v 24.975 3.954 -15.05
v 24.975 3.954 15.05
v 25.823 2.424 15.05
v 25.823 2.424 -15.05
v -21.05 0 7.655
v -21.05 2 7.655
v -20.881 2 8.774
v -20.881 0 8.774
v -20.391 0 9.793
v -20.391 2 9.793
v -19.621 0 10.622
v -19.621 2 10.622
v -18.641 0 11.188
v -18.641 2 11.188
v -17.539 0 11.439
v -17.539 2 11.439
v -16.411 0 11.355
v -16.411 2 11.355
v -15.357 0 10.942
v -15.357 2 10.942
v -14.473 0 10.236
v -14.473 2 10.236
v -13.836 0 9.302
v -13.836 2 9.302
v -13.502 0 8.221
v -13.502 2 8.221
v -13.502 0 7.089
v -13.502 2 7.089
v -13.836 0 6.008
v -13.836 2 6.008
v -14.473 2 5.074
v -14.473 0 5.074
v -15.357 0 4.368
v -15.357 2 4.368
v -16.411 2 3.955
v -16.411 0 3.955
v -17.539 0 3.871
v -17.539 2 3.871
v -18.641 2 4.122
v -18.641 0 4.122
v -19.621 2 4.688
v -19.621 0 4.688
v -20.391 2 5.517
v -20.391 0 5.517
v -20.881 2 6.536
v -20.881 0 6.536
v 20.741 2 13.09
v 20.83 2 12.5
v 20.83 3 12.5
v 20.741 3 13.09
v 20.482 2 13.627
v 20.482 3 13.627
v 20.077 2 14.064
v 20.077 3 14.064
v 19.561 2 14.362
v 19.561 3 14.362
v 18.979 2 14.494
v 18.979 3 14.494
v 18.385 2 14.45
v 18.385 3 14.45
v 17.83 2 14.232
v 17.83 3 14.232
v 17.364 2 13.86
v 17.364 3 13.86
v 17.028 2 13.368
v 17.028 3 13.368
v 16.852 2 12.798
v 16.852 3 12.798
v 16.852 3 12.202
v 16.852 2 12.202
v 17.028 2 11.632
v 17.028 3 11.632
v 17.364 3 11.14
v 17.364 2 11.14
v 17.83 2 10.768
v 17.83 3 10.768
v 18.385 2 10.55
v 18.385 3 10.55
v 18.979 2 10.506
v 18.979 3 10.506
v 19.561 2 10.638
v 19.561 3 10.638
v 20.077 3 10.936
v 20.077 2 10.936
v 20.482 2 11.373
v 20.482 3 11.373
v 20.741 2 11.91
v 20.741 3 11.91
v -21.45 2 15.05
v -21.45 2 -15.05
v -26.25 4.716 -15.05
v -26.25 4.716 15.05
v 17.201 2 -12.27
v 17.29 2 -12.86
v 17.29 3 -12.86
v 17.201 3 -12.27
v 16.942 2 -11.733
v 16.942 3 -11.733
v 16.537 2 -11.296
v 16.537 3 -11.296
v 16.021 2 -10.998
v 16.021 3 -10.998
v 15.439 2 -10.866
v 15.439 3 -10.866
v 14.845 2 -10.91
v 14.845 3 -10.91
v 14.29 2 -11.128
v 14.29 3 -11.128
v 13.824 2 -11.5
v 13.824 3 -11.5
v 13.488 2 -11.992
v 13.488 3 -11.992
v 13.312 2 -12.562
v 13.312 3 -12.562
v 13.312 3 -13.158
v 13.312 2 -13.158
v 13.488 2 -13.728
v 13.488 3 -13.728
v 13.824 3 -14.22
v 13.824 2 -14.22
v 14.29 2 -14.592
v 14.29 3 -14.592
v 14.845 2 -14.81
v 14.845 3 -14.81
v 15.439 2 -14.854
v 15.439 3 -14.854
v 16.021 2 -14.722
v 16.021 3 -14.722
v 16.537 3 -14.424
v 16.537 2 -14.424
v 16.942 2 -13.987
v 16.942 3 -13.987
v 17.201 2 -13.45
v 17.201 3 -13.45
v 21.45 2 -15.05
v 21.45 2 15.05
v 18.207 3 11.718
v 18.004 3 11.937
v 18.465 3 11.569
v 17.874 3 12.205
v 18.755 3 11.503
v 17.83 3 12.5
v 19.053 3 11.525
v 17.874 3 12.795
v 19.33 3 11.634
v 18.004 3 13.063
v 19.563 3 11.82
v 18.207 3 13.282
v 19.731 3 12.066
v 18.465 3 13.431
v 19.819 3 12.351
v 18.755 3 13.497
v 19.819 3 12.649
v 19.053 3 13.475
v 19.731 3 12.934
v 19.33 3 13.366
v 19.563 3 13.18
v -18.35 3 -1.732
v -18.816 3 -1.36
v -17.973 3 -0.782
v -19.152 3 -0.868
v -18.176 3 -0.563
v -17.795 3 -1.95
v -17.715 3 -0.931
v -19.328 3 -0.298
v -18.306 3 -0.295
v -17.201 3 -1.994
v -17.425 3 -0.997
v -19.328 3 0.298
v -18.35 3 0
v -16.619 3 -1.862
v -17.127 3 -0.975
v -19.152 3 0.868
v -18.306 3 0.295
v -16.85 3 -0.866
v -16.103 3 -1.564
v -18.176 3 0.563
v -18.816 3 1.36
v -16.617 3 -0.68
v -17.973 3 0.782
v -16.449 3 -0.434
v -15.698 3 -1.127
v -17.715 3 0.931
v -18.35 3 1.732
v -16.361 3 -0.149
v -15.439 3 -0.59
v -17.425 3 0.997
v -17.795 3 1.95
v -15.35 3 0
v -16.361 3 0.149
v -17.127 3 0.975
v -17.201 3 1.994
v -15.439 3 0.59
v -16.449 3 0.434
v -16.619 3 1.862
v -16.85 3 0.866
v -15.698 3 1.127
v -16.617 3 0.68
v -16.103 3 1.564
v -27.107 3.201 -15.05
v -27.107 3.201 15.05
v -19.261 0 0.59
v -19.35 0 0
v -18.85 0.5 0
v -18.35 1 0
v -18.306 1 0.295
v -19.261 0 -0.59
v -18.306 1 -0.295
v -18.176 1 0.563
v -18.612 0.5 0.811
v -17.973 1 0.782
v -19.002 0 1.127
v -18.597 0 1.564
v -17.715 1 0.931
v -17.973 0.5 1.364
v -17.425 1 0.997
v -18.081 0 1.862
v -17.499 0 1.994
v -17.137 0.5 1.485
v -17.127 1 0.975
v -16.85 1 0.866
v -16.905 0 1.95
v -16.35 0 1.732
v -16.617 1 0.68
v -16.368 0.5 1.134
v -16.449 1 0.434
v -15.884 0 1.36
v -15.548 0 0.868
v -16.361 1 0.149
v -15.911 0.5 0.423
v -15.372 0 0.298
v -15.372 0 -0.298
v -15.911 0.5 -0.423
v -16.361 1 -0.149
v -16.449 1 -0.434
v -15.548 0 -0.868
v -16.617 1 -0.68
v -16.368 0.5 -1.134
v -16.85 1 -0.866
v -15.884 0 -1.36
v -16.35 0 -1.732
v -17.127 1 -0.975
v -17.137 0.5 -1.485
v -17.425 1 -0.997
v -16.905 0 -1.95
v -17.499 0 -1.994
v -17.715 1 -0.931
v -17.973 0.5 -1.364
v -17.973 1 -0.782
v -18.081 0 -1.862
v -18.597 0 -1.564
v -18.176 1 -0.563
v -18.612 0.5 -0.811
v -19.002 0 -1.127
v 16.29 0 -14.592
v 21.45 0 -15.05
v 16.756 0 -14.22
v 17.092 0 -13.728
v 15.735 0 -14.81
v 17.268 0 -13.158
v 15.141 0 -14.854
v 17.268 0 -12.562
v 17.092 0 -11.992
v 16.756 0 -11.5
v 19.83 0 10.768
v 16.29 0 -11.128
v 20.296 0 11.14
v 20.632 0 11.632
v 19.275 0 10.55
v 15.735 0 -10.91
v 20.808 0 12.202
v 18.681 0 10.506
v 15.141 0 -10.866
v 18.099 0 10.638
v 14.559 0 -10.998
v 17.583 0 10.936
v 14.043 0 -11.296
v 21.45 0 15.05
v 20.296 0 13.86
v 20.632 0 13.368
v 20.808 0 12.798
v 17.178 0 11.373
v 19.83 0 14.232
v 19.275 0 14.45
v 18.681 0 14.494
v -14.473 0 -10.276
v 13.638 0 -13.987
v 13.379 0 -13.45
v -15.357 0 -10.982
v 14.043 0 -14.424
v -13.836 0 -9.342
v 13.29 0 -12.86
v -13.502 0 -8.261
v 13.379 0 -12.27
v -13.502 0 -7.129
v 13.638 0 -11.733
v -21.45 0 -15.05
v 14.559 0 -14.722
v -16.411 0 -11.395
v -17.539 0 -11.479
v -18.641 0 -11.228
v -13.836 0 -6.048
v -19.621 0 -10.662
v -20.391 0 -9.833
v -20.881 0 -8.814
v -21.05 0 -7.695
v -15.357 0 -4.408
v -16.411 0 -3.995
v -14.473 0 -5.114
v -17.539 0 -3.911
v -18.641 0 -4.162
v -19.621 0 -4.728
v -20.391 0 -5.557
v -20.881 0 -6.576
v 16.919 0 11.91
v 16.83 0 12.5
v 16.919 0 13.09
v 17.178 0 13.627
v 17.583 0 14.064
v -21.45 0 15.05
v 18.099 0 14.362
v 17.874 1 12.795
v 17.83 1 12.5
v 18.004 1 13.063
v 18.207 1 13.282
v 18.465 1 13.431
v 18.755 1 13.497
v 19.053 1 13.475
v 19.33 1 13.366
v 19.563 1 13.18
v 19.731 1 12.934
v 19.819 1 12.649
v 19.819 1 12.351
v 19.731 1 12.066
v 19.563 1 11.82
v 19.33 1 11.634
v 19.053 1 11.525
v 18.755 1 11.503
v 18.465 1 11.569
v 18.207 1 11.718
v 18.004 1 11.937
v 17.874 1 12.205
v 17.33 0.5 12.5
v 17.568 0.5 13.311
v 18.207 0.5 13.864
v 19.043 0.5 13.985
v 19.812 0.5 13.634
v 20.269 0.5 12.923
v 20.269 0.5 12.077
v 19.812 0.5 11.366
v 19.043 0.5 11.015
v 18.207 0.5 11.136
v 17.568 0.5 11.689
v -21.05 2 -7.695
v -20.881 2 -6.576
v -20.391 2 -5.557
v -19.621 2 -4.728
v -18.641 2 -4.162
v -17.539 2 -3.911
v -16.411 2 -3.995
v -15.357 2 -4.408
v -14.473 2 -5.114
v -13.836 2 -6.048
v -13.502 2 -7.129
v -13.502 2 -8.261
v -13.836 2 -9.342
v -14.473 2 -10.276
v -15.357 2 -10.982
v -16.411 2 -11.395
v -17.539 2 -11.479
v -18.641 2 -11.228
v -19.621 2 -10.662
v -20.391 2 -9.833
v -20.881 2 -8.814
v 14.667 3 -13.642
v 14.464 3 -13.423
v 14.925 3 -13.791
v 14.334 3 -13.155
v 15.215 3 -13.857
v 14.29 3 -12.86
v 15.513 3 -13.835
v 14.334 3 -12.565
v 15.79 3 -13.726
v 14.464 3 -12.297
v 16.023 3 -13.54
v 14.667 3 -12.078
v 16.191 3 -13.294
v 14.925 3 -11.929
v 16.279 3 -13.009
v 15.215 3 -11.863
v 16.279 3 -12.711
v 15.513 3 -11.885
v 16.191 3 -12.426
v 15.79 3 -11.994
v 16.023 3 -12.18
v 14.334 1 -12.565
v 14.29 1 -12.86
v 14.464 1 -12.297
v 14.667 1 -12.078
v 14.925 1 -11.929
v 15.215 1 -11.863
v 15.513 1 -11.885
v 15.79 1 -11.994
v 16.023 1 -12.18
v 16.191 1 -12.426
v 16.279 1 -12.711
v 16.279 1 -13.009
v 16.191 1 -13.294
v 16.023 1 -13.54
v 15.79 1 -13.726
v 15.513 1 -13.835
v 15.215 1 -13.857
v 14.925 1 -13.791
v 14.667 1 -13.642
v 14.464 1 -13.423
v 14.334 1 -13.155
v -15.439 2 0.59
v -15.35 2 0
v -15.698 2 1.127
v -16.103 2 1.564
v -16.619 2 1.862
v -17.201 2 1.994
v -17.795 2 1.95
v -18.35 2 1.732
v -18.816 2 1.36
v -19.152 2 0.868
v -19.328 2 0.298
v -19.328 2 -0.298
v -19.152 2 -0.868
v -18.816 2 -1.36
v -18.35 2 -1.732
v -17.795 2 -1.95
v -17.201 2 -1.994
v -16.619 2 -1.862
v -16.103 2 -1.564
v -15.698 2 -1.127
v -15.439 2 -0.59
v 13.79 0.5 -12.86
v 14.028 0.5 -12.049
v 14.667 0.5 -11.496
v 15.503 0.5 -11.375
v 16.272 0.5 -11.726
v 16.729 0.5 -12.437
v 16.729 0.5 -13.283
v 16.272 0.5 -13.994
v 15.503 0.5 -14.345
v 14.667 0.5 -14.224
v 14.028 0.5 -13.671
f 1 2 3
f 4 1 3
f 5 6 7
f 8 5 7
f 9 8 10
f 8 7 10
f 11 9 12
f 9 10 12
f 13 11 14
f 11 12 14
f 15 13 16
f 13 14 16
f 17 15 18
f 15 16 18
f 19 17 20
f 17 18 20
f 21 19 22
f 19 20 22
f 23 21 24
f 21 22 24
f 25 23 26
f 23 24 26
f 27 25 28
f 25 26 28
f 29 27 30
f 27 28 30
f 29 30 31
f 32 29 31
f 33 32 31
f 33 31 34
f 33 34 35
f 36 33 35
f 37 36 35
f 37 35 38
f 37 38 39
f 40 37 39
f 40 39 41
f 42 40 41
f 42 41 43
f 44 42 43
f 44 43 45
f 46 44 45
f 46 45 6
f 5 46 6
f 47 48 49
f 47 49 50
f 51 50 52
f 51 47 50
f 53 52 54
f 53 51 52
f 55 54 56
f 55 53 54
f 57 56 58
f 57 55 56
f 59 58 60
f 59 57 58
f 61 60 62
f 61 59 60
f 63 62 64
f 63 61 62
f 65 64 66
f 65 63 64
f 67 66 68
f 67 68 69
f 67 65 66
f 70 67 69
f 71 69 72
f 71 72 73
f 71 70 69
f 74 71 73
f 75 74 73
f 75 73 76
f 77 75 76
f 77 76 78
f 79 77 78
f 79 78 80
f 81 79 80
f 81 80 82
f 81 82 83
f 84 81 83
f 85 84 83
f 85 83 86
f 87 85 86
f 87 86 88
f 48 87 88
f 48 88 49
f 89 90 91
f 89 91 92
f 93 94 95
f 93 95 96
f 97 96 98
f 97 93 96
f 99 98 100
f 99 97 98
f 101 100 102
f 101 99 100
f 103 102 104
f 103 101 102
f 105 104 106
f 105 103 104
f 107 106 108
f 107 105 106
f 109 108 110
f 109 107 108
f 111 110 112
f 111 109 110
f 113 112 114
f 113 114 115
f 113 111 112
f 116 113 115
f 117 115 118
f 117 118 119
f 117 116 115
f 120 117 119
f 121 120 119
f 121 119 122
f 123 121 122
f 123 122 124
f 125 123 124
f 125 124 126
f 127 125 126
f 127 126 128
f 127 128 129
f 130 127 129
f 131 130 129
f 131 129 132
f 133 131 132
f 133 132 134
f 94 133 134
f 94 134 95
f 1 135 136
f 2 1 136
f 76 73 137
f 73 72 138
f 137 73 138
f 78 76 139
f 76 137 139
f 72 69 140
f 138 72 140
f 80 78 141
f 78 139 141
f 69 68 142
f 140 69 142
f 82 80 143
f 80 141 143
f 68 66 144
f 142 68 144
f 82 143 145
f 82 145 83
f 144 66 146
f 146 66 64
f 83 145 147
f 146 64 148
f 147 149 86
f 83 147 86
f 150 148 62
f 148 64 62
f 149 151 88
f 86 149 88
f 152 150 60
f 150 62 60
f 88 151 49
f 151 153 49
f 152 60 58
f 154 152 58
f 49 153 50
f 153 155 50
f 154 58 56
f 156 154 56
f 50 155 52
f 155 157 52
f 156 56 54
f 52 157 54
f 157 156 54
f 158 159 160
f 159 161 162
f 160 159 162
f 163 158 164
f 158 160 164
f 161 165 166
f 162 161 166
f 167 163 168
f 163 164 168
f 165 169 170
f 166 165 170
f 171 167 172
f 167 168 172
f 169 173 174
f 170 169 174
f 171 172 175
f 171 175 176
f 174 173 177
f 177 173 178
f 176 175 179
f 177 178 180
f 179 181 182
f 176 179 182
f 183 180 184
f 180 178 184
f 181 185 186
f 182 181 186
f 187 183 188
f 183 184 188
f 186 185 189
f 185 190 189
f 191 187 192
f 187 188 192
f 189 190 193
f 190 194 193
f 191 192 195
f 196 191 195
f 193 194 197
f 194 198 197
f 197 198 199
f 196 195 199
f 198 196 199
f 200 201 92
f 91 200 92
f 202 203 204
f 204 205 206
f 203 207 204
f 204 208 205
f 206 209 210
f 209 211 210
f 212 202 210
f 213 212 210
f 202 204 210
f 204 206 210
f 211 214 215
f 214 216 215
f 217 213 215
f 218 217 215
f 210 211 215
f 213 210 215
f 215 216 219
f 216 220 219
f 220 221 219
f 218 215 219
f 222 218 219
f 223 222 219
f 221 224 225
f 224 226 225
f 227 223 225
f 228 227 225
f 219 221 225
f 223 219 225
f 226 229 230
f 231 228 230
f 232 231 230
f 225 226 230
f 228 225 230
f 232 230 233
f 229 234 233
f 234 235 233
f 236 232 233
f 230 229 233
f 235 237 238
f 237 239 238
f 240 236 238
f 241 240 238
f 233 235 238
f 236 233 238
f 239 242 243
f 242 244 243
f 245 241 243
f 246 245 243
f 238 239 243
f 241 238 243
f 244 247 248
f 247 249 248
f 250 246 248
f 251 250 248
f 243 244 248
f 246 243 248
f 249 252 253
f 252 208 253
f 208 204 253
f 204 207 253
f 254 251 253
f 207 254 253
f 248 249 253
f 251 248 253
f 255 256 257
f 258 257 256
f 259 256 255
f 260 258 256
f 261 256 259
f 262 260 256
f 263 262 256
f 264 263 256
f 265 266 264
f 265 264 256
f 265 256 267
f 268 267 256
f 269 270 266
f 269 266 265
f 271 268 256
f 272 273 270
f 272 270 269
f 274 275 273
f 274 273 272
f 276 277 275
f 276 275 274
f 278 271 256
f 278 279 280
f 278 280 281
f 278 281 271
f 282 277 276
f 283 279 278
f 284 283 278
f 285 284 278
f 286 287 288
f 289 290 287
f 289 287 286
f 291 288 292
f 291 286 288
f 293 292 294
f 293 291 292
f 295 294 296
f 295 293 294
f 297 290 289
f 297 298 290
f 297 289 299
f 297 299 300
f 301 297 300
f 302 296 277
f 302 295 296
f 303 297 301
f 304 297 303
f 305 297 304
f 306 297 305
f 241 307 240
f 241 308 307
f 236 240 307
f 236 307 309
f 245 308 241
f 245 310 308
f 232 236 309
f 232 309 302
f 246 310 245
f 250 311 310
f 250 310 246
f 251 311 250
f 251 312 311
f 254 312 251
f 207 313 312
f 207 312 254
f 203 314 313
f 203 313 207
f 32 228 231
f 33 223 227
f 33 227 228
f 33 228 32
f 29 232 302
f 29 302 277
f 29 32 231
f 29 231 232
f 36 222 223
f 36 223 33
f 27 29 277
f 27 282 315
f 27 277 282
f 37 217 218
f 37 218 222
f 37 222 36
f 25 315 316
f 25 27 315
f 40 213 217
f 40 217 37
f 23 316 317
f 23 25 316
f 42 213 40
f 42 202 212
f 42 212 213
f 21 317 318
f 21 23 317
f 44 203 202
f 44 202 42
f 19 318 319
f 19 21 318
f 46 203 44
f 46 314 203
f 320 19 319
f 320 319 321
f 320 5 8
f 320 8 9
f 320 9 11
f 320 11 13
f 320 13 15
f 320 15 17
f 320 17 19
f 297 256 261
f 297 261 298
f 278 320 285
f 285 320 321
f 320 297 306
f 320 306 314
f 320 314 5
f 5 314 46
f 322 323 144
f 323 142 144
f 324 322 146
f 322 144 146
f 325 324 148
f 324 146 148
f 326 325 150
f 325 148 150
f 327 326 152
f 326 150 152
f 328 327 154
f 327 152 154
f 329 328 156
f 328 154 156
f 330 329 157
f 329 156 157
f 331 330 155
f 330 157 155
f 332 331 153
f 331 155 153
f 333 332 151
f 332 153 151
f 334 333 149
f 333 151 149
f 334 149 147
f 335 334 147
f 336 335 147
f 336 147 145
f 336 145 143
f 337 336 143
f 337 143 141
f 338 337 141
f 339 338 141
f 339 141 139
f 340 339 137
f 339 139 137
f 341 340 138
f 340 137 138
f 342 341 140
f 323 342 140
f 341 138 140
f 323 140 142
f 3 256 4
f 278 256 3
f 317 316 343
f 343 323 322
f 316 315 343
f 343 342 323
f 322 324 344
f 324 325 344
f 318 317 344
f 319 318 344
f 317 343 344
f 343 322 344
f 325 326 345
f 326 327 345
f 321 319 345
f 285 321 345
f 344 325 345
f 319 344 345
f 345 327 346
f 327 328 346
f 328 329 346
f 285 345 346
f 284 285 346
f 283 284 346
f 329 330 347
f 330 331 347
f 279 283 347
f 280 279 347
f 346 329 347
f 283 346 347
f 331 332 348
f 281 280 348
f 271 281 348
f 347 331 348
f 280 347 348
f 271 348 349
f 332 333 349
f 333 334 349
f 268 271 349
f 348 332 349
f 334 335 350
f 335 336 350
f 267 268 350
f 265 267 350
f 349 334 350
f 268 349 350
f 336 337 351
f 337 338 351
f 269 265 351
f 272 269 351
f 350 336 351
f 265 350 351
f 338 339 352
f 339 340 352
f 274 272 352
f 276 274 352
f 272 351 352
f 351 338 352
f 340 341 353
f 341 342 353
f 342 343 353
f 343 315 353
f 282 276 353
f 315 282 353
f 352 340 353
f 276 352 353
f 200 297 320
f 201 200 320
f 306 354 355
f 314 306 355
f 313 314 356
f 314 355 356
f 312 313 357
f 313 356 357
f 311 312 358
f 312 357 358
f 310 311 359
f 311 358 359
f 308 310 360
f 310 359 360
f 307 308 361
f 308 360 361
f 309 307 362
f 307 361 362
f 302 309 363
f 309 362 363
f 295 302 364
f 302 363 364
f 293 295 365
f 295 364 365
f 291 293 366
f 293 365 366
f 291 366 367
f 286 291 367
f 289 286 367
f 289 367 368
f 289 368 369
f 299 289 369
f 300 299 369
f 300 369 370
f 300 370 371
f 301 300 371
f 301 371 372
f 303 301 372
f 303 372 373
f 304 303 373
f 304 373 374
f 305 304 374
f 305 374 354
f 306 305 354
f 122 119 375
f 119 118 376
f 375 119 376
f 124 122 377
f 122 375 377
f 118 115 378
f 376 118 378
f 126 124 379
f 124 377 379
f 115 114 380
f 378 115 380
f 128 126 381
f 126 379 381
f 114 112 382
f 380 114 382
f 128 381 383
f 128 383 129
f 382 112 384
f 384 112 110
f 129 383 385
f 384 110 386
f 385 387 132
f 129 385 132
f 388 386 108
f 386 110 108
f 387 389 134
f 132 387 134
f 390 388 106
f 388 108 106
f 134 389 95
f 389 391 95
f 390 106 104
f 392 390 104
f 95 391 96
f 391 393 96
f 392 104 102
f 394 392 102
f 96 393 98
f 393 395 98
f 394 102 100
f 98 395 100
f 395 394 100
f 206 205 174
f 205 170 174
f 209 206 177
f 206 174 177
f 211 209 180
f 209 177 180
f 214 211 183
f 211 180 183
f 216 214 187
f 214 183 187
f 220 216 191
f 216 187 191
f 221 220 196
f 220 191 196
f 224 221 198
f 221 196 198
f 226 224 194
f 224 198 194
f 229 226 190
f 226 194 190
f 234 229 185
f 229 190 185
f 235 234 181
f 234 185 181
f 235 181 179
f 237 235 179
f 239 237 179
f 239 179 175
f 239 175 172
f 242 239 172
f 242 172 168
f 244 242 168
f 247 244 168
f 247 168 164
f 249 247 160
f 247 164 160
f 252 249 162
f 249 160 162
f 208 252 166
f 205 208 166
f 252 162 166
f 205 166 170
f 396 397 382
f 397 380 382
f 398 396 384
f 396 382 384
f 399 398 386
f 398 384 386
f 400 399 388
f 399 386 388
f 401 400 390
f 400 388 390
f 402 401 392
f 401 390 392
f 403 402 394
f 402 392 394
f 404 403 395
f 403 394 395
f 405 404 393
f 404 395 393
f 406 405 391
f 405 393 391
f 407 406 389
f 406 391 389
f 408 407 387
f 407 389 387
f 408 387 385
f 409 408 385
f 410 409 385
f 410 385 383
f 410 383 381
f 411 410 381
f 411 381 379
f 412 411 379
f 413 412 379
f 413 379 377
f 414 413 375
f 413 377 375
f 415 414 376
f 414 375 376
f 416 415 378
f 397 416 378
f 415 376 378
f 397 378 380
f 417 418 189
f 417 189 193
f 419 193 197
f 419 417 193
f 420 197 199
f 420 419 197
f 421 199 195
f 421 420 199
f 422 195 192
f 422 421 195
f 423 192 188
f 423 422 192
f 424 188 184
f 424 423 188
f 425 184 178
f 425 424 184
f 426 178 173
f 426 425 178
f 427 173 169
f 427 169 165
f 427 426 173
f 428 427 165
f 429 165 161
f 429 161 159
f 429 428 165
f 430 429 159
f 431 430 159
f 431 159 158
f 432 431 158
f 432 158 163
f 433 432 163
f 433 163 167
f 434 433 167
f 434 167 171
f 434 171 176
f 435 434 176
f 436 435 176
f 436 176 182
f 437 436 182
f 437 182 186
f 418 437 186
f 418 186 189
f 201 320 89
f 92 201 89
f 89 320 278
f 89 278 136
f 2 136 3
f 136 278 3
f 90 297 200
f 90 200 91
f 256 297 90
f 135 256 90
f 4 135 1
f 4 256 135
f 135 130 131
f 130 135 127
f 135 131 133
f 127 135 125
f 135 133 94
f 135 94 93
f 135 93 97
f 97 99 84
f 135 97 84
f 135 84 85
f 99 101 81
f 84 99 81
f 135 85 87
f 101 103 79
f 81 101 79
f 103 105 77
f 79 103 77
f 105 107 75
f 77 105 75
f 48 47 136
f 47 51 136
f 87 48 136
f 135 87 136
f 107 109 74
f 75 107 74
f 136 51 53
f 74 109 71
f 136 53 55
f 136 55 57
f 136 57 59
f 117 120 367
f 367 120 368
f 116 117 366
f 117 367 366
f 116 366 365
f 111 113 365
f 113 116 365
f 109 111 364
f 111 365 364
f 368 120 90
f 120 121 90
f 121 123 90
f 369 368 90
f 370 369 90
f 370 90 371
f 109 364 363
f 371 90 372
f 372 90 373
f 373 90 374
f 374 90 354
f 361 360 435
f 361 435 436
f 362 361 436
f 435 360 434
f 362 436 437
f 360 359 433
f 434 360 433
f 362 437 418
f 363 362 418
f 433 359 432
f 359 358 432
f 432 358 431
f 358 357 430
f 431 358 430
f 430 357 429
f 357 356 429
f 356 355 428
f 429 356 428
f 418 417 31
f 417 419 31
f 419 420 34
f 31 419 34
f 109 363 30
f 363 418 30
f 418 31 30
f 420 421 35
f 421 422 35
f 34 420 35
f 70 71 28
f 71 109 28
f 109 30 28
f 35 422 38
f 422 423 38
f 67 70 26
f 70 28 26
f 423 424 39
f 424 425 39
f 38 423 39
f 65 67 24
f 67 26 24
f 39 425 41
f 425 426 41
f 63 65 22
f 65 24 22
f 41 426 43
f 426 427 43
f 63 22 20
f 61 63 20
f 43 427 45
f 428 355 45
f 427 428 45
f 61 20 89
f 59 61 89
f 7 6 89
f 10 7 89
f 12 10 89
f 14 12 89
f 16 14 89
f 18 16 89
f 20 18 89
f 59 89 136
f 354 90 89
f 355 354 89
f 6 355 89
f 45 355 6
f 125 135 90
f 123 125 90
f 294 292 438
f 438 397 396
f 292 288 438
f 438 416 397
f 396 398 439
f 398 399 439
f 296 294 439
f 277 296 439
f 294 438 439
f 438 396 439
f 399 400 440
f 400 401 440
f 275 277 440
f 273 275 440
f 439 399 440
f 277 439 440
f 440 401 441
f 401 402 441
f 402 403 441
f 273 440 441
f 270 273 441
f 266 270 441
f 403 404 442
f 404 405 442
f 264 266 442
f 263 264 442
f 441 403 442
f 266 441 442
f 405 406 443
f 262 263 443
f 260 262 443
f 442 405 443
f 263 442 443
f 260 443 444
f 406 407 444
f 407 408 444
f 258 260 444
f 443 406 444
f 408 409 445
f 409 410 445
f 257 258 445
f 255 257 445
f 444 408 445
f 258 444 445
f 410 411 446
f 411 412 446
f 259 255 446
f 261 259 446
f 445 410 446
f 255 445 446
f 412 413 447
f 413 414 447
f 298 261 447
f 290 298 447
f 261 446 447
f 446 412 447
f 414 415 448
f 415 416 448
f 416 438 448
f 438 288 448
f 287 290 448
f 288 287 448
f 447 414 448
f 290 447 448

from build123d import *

# Parameters (mm, degrees)
F0_W            = 42.7
F0_H            = 30.1
F0_R            = 2
F1_DEPTH        = 2
F2_DEPTH        = 3
F3_DEPTH        = 0.1
F4_DEPTH        = 0.1
F6_W            = 1.7407113919
F6_H            = 30.1
F7_DEPTH        = 6.5
F9_W            = 1.7492394143
F9_H            = 30.1
F10_DEPTH       = 5
F11_D           = 2
F11_CSINK_D     = 4
F11_CSINK_ANGLE = 90
F12_D           = 7.59


# Not quite as in the source:
# - a feature names something its author has since deleted; it is built from what else it names


with BuildPart() as f1:
    # F0 (on Front) → F1 (new body)
    with BuildSketch(Plane.XZ):
        Rectangle(F0_W, F0_H)
        with Locations((-17.35, 0)):
            Circle(F0_R, mode=Mode.SUBTRACT)
        with Locations((15.29, -12.86)):
            Circle(F0_R, mode=Mode.SUBTRACT)
        with Locations((18.83, 12.5)):
            Circle(F0_R, mode=Mode.SUBTRACT)
        with Locations((18.83, 12.5)):
            Circle(F0_R)
        with Locations((-17.35, 0)):
            Circle(F0_R)
        with Locations((15.29, -12.86)):
            Circle(F0_R)
    extrude(amount=-F1_DEPTH)

    # F0 (on Front) → F2 (join)
    with BuildSketch(Plane.XZ):
        with Locations((18.83, 12.5)):
            Circle(F0_R)
        with Locations((15.29, -12.86)):
            Circle(F0_R)
        with Locations((-17.35, 0)):
            Circle(F0_R)
    extrude(amount=-F2_DEPTH)

    # F3 (add): a face of the model
    f3_faces = [f1.faces().sort_by_distance(p)[0] for p in [
        (-21.35, 1, 0),
    ]]
    extrude(f3_faces, amount=F3_DEPTH)

    # F4 (add): a face of the model
    f4_faces = [f1.faces().sort_by_distance(p)[0] for p in [
        (21.35, 1, 0),
    ]]
    extrude(f4_faces, amount=F4_DEPTH)

    # F6 (on face) → F7 (join)
    with BuildSketch(Plane(origin=(-16.2487833534, 9.1931193, 0), x_dir=(0.4924235601, 0.8703556959, 0), z_dir=(0.8703556959, -0.4924235601, 0))):
        with Locations((-9.6921296683, 0)):
            Rectangle(F6_W, F6_H)
    extrude(amount=-F7_DEPTH)

    # F9 (on face) → F10 (join)
    with BuildSketch(Plane(origin=(16.4083841089, 9.0953158313, 0), x_dir=(0.4848096202, -0.8746197071, 0), z_dir=(-0.8746197071, -0.4848096202, 0))):
        with Locations((9.5245466471, 0)):
            Rectangle(F9_W, F9_H)
    extrude(amount=-F10_DEPTH)

    # F11 (through all)
    with Locations(Plane.XZ):
        with Locations((-17.35, 0), (18.83, 12.5), (15.29, -12.86)):
            CounterSinkHole(F11_D / 2, F11_CSINK_D / 2, counter_sink_angle=F11_CSINK_ANGLE)

    # F12 (through all)
    with Locations(Plane.XZ):
        with Locations((-17.255, 7.655), (-17.255, -7.695)):
            Hole(F12_D / 2)


solid = f1.part
